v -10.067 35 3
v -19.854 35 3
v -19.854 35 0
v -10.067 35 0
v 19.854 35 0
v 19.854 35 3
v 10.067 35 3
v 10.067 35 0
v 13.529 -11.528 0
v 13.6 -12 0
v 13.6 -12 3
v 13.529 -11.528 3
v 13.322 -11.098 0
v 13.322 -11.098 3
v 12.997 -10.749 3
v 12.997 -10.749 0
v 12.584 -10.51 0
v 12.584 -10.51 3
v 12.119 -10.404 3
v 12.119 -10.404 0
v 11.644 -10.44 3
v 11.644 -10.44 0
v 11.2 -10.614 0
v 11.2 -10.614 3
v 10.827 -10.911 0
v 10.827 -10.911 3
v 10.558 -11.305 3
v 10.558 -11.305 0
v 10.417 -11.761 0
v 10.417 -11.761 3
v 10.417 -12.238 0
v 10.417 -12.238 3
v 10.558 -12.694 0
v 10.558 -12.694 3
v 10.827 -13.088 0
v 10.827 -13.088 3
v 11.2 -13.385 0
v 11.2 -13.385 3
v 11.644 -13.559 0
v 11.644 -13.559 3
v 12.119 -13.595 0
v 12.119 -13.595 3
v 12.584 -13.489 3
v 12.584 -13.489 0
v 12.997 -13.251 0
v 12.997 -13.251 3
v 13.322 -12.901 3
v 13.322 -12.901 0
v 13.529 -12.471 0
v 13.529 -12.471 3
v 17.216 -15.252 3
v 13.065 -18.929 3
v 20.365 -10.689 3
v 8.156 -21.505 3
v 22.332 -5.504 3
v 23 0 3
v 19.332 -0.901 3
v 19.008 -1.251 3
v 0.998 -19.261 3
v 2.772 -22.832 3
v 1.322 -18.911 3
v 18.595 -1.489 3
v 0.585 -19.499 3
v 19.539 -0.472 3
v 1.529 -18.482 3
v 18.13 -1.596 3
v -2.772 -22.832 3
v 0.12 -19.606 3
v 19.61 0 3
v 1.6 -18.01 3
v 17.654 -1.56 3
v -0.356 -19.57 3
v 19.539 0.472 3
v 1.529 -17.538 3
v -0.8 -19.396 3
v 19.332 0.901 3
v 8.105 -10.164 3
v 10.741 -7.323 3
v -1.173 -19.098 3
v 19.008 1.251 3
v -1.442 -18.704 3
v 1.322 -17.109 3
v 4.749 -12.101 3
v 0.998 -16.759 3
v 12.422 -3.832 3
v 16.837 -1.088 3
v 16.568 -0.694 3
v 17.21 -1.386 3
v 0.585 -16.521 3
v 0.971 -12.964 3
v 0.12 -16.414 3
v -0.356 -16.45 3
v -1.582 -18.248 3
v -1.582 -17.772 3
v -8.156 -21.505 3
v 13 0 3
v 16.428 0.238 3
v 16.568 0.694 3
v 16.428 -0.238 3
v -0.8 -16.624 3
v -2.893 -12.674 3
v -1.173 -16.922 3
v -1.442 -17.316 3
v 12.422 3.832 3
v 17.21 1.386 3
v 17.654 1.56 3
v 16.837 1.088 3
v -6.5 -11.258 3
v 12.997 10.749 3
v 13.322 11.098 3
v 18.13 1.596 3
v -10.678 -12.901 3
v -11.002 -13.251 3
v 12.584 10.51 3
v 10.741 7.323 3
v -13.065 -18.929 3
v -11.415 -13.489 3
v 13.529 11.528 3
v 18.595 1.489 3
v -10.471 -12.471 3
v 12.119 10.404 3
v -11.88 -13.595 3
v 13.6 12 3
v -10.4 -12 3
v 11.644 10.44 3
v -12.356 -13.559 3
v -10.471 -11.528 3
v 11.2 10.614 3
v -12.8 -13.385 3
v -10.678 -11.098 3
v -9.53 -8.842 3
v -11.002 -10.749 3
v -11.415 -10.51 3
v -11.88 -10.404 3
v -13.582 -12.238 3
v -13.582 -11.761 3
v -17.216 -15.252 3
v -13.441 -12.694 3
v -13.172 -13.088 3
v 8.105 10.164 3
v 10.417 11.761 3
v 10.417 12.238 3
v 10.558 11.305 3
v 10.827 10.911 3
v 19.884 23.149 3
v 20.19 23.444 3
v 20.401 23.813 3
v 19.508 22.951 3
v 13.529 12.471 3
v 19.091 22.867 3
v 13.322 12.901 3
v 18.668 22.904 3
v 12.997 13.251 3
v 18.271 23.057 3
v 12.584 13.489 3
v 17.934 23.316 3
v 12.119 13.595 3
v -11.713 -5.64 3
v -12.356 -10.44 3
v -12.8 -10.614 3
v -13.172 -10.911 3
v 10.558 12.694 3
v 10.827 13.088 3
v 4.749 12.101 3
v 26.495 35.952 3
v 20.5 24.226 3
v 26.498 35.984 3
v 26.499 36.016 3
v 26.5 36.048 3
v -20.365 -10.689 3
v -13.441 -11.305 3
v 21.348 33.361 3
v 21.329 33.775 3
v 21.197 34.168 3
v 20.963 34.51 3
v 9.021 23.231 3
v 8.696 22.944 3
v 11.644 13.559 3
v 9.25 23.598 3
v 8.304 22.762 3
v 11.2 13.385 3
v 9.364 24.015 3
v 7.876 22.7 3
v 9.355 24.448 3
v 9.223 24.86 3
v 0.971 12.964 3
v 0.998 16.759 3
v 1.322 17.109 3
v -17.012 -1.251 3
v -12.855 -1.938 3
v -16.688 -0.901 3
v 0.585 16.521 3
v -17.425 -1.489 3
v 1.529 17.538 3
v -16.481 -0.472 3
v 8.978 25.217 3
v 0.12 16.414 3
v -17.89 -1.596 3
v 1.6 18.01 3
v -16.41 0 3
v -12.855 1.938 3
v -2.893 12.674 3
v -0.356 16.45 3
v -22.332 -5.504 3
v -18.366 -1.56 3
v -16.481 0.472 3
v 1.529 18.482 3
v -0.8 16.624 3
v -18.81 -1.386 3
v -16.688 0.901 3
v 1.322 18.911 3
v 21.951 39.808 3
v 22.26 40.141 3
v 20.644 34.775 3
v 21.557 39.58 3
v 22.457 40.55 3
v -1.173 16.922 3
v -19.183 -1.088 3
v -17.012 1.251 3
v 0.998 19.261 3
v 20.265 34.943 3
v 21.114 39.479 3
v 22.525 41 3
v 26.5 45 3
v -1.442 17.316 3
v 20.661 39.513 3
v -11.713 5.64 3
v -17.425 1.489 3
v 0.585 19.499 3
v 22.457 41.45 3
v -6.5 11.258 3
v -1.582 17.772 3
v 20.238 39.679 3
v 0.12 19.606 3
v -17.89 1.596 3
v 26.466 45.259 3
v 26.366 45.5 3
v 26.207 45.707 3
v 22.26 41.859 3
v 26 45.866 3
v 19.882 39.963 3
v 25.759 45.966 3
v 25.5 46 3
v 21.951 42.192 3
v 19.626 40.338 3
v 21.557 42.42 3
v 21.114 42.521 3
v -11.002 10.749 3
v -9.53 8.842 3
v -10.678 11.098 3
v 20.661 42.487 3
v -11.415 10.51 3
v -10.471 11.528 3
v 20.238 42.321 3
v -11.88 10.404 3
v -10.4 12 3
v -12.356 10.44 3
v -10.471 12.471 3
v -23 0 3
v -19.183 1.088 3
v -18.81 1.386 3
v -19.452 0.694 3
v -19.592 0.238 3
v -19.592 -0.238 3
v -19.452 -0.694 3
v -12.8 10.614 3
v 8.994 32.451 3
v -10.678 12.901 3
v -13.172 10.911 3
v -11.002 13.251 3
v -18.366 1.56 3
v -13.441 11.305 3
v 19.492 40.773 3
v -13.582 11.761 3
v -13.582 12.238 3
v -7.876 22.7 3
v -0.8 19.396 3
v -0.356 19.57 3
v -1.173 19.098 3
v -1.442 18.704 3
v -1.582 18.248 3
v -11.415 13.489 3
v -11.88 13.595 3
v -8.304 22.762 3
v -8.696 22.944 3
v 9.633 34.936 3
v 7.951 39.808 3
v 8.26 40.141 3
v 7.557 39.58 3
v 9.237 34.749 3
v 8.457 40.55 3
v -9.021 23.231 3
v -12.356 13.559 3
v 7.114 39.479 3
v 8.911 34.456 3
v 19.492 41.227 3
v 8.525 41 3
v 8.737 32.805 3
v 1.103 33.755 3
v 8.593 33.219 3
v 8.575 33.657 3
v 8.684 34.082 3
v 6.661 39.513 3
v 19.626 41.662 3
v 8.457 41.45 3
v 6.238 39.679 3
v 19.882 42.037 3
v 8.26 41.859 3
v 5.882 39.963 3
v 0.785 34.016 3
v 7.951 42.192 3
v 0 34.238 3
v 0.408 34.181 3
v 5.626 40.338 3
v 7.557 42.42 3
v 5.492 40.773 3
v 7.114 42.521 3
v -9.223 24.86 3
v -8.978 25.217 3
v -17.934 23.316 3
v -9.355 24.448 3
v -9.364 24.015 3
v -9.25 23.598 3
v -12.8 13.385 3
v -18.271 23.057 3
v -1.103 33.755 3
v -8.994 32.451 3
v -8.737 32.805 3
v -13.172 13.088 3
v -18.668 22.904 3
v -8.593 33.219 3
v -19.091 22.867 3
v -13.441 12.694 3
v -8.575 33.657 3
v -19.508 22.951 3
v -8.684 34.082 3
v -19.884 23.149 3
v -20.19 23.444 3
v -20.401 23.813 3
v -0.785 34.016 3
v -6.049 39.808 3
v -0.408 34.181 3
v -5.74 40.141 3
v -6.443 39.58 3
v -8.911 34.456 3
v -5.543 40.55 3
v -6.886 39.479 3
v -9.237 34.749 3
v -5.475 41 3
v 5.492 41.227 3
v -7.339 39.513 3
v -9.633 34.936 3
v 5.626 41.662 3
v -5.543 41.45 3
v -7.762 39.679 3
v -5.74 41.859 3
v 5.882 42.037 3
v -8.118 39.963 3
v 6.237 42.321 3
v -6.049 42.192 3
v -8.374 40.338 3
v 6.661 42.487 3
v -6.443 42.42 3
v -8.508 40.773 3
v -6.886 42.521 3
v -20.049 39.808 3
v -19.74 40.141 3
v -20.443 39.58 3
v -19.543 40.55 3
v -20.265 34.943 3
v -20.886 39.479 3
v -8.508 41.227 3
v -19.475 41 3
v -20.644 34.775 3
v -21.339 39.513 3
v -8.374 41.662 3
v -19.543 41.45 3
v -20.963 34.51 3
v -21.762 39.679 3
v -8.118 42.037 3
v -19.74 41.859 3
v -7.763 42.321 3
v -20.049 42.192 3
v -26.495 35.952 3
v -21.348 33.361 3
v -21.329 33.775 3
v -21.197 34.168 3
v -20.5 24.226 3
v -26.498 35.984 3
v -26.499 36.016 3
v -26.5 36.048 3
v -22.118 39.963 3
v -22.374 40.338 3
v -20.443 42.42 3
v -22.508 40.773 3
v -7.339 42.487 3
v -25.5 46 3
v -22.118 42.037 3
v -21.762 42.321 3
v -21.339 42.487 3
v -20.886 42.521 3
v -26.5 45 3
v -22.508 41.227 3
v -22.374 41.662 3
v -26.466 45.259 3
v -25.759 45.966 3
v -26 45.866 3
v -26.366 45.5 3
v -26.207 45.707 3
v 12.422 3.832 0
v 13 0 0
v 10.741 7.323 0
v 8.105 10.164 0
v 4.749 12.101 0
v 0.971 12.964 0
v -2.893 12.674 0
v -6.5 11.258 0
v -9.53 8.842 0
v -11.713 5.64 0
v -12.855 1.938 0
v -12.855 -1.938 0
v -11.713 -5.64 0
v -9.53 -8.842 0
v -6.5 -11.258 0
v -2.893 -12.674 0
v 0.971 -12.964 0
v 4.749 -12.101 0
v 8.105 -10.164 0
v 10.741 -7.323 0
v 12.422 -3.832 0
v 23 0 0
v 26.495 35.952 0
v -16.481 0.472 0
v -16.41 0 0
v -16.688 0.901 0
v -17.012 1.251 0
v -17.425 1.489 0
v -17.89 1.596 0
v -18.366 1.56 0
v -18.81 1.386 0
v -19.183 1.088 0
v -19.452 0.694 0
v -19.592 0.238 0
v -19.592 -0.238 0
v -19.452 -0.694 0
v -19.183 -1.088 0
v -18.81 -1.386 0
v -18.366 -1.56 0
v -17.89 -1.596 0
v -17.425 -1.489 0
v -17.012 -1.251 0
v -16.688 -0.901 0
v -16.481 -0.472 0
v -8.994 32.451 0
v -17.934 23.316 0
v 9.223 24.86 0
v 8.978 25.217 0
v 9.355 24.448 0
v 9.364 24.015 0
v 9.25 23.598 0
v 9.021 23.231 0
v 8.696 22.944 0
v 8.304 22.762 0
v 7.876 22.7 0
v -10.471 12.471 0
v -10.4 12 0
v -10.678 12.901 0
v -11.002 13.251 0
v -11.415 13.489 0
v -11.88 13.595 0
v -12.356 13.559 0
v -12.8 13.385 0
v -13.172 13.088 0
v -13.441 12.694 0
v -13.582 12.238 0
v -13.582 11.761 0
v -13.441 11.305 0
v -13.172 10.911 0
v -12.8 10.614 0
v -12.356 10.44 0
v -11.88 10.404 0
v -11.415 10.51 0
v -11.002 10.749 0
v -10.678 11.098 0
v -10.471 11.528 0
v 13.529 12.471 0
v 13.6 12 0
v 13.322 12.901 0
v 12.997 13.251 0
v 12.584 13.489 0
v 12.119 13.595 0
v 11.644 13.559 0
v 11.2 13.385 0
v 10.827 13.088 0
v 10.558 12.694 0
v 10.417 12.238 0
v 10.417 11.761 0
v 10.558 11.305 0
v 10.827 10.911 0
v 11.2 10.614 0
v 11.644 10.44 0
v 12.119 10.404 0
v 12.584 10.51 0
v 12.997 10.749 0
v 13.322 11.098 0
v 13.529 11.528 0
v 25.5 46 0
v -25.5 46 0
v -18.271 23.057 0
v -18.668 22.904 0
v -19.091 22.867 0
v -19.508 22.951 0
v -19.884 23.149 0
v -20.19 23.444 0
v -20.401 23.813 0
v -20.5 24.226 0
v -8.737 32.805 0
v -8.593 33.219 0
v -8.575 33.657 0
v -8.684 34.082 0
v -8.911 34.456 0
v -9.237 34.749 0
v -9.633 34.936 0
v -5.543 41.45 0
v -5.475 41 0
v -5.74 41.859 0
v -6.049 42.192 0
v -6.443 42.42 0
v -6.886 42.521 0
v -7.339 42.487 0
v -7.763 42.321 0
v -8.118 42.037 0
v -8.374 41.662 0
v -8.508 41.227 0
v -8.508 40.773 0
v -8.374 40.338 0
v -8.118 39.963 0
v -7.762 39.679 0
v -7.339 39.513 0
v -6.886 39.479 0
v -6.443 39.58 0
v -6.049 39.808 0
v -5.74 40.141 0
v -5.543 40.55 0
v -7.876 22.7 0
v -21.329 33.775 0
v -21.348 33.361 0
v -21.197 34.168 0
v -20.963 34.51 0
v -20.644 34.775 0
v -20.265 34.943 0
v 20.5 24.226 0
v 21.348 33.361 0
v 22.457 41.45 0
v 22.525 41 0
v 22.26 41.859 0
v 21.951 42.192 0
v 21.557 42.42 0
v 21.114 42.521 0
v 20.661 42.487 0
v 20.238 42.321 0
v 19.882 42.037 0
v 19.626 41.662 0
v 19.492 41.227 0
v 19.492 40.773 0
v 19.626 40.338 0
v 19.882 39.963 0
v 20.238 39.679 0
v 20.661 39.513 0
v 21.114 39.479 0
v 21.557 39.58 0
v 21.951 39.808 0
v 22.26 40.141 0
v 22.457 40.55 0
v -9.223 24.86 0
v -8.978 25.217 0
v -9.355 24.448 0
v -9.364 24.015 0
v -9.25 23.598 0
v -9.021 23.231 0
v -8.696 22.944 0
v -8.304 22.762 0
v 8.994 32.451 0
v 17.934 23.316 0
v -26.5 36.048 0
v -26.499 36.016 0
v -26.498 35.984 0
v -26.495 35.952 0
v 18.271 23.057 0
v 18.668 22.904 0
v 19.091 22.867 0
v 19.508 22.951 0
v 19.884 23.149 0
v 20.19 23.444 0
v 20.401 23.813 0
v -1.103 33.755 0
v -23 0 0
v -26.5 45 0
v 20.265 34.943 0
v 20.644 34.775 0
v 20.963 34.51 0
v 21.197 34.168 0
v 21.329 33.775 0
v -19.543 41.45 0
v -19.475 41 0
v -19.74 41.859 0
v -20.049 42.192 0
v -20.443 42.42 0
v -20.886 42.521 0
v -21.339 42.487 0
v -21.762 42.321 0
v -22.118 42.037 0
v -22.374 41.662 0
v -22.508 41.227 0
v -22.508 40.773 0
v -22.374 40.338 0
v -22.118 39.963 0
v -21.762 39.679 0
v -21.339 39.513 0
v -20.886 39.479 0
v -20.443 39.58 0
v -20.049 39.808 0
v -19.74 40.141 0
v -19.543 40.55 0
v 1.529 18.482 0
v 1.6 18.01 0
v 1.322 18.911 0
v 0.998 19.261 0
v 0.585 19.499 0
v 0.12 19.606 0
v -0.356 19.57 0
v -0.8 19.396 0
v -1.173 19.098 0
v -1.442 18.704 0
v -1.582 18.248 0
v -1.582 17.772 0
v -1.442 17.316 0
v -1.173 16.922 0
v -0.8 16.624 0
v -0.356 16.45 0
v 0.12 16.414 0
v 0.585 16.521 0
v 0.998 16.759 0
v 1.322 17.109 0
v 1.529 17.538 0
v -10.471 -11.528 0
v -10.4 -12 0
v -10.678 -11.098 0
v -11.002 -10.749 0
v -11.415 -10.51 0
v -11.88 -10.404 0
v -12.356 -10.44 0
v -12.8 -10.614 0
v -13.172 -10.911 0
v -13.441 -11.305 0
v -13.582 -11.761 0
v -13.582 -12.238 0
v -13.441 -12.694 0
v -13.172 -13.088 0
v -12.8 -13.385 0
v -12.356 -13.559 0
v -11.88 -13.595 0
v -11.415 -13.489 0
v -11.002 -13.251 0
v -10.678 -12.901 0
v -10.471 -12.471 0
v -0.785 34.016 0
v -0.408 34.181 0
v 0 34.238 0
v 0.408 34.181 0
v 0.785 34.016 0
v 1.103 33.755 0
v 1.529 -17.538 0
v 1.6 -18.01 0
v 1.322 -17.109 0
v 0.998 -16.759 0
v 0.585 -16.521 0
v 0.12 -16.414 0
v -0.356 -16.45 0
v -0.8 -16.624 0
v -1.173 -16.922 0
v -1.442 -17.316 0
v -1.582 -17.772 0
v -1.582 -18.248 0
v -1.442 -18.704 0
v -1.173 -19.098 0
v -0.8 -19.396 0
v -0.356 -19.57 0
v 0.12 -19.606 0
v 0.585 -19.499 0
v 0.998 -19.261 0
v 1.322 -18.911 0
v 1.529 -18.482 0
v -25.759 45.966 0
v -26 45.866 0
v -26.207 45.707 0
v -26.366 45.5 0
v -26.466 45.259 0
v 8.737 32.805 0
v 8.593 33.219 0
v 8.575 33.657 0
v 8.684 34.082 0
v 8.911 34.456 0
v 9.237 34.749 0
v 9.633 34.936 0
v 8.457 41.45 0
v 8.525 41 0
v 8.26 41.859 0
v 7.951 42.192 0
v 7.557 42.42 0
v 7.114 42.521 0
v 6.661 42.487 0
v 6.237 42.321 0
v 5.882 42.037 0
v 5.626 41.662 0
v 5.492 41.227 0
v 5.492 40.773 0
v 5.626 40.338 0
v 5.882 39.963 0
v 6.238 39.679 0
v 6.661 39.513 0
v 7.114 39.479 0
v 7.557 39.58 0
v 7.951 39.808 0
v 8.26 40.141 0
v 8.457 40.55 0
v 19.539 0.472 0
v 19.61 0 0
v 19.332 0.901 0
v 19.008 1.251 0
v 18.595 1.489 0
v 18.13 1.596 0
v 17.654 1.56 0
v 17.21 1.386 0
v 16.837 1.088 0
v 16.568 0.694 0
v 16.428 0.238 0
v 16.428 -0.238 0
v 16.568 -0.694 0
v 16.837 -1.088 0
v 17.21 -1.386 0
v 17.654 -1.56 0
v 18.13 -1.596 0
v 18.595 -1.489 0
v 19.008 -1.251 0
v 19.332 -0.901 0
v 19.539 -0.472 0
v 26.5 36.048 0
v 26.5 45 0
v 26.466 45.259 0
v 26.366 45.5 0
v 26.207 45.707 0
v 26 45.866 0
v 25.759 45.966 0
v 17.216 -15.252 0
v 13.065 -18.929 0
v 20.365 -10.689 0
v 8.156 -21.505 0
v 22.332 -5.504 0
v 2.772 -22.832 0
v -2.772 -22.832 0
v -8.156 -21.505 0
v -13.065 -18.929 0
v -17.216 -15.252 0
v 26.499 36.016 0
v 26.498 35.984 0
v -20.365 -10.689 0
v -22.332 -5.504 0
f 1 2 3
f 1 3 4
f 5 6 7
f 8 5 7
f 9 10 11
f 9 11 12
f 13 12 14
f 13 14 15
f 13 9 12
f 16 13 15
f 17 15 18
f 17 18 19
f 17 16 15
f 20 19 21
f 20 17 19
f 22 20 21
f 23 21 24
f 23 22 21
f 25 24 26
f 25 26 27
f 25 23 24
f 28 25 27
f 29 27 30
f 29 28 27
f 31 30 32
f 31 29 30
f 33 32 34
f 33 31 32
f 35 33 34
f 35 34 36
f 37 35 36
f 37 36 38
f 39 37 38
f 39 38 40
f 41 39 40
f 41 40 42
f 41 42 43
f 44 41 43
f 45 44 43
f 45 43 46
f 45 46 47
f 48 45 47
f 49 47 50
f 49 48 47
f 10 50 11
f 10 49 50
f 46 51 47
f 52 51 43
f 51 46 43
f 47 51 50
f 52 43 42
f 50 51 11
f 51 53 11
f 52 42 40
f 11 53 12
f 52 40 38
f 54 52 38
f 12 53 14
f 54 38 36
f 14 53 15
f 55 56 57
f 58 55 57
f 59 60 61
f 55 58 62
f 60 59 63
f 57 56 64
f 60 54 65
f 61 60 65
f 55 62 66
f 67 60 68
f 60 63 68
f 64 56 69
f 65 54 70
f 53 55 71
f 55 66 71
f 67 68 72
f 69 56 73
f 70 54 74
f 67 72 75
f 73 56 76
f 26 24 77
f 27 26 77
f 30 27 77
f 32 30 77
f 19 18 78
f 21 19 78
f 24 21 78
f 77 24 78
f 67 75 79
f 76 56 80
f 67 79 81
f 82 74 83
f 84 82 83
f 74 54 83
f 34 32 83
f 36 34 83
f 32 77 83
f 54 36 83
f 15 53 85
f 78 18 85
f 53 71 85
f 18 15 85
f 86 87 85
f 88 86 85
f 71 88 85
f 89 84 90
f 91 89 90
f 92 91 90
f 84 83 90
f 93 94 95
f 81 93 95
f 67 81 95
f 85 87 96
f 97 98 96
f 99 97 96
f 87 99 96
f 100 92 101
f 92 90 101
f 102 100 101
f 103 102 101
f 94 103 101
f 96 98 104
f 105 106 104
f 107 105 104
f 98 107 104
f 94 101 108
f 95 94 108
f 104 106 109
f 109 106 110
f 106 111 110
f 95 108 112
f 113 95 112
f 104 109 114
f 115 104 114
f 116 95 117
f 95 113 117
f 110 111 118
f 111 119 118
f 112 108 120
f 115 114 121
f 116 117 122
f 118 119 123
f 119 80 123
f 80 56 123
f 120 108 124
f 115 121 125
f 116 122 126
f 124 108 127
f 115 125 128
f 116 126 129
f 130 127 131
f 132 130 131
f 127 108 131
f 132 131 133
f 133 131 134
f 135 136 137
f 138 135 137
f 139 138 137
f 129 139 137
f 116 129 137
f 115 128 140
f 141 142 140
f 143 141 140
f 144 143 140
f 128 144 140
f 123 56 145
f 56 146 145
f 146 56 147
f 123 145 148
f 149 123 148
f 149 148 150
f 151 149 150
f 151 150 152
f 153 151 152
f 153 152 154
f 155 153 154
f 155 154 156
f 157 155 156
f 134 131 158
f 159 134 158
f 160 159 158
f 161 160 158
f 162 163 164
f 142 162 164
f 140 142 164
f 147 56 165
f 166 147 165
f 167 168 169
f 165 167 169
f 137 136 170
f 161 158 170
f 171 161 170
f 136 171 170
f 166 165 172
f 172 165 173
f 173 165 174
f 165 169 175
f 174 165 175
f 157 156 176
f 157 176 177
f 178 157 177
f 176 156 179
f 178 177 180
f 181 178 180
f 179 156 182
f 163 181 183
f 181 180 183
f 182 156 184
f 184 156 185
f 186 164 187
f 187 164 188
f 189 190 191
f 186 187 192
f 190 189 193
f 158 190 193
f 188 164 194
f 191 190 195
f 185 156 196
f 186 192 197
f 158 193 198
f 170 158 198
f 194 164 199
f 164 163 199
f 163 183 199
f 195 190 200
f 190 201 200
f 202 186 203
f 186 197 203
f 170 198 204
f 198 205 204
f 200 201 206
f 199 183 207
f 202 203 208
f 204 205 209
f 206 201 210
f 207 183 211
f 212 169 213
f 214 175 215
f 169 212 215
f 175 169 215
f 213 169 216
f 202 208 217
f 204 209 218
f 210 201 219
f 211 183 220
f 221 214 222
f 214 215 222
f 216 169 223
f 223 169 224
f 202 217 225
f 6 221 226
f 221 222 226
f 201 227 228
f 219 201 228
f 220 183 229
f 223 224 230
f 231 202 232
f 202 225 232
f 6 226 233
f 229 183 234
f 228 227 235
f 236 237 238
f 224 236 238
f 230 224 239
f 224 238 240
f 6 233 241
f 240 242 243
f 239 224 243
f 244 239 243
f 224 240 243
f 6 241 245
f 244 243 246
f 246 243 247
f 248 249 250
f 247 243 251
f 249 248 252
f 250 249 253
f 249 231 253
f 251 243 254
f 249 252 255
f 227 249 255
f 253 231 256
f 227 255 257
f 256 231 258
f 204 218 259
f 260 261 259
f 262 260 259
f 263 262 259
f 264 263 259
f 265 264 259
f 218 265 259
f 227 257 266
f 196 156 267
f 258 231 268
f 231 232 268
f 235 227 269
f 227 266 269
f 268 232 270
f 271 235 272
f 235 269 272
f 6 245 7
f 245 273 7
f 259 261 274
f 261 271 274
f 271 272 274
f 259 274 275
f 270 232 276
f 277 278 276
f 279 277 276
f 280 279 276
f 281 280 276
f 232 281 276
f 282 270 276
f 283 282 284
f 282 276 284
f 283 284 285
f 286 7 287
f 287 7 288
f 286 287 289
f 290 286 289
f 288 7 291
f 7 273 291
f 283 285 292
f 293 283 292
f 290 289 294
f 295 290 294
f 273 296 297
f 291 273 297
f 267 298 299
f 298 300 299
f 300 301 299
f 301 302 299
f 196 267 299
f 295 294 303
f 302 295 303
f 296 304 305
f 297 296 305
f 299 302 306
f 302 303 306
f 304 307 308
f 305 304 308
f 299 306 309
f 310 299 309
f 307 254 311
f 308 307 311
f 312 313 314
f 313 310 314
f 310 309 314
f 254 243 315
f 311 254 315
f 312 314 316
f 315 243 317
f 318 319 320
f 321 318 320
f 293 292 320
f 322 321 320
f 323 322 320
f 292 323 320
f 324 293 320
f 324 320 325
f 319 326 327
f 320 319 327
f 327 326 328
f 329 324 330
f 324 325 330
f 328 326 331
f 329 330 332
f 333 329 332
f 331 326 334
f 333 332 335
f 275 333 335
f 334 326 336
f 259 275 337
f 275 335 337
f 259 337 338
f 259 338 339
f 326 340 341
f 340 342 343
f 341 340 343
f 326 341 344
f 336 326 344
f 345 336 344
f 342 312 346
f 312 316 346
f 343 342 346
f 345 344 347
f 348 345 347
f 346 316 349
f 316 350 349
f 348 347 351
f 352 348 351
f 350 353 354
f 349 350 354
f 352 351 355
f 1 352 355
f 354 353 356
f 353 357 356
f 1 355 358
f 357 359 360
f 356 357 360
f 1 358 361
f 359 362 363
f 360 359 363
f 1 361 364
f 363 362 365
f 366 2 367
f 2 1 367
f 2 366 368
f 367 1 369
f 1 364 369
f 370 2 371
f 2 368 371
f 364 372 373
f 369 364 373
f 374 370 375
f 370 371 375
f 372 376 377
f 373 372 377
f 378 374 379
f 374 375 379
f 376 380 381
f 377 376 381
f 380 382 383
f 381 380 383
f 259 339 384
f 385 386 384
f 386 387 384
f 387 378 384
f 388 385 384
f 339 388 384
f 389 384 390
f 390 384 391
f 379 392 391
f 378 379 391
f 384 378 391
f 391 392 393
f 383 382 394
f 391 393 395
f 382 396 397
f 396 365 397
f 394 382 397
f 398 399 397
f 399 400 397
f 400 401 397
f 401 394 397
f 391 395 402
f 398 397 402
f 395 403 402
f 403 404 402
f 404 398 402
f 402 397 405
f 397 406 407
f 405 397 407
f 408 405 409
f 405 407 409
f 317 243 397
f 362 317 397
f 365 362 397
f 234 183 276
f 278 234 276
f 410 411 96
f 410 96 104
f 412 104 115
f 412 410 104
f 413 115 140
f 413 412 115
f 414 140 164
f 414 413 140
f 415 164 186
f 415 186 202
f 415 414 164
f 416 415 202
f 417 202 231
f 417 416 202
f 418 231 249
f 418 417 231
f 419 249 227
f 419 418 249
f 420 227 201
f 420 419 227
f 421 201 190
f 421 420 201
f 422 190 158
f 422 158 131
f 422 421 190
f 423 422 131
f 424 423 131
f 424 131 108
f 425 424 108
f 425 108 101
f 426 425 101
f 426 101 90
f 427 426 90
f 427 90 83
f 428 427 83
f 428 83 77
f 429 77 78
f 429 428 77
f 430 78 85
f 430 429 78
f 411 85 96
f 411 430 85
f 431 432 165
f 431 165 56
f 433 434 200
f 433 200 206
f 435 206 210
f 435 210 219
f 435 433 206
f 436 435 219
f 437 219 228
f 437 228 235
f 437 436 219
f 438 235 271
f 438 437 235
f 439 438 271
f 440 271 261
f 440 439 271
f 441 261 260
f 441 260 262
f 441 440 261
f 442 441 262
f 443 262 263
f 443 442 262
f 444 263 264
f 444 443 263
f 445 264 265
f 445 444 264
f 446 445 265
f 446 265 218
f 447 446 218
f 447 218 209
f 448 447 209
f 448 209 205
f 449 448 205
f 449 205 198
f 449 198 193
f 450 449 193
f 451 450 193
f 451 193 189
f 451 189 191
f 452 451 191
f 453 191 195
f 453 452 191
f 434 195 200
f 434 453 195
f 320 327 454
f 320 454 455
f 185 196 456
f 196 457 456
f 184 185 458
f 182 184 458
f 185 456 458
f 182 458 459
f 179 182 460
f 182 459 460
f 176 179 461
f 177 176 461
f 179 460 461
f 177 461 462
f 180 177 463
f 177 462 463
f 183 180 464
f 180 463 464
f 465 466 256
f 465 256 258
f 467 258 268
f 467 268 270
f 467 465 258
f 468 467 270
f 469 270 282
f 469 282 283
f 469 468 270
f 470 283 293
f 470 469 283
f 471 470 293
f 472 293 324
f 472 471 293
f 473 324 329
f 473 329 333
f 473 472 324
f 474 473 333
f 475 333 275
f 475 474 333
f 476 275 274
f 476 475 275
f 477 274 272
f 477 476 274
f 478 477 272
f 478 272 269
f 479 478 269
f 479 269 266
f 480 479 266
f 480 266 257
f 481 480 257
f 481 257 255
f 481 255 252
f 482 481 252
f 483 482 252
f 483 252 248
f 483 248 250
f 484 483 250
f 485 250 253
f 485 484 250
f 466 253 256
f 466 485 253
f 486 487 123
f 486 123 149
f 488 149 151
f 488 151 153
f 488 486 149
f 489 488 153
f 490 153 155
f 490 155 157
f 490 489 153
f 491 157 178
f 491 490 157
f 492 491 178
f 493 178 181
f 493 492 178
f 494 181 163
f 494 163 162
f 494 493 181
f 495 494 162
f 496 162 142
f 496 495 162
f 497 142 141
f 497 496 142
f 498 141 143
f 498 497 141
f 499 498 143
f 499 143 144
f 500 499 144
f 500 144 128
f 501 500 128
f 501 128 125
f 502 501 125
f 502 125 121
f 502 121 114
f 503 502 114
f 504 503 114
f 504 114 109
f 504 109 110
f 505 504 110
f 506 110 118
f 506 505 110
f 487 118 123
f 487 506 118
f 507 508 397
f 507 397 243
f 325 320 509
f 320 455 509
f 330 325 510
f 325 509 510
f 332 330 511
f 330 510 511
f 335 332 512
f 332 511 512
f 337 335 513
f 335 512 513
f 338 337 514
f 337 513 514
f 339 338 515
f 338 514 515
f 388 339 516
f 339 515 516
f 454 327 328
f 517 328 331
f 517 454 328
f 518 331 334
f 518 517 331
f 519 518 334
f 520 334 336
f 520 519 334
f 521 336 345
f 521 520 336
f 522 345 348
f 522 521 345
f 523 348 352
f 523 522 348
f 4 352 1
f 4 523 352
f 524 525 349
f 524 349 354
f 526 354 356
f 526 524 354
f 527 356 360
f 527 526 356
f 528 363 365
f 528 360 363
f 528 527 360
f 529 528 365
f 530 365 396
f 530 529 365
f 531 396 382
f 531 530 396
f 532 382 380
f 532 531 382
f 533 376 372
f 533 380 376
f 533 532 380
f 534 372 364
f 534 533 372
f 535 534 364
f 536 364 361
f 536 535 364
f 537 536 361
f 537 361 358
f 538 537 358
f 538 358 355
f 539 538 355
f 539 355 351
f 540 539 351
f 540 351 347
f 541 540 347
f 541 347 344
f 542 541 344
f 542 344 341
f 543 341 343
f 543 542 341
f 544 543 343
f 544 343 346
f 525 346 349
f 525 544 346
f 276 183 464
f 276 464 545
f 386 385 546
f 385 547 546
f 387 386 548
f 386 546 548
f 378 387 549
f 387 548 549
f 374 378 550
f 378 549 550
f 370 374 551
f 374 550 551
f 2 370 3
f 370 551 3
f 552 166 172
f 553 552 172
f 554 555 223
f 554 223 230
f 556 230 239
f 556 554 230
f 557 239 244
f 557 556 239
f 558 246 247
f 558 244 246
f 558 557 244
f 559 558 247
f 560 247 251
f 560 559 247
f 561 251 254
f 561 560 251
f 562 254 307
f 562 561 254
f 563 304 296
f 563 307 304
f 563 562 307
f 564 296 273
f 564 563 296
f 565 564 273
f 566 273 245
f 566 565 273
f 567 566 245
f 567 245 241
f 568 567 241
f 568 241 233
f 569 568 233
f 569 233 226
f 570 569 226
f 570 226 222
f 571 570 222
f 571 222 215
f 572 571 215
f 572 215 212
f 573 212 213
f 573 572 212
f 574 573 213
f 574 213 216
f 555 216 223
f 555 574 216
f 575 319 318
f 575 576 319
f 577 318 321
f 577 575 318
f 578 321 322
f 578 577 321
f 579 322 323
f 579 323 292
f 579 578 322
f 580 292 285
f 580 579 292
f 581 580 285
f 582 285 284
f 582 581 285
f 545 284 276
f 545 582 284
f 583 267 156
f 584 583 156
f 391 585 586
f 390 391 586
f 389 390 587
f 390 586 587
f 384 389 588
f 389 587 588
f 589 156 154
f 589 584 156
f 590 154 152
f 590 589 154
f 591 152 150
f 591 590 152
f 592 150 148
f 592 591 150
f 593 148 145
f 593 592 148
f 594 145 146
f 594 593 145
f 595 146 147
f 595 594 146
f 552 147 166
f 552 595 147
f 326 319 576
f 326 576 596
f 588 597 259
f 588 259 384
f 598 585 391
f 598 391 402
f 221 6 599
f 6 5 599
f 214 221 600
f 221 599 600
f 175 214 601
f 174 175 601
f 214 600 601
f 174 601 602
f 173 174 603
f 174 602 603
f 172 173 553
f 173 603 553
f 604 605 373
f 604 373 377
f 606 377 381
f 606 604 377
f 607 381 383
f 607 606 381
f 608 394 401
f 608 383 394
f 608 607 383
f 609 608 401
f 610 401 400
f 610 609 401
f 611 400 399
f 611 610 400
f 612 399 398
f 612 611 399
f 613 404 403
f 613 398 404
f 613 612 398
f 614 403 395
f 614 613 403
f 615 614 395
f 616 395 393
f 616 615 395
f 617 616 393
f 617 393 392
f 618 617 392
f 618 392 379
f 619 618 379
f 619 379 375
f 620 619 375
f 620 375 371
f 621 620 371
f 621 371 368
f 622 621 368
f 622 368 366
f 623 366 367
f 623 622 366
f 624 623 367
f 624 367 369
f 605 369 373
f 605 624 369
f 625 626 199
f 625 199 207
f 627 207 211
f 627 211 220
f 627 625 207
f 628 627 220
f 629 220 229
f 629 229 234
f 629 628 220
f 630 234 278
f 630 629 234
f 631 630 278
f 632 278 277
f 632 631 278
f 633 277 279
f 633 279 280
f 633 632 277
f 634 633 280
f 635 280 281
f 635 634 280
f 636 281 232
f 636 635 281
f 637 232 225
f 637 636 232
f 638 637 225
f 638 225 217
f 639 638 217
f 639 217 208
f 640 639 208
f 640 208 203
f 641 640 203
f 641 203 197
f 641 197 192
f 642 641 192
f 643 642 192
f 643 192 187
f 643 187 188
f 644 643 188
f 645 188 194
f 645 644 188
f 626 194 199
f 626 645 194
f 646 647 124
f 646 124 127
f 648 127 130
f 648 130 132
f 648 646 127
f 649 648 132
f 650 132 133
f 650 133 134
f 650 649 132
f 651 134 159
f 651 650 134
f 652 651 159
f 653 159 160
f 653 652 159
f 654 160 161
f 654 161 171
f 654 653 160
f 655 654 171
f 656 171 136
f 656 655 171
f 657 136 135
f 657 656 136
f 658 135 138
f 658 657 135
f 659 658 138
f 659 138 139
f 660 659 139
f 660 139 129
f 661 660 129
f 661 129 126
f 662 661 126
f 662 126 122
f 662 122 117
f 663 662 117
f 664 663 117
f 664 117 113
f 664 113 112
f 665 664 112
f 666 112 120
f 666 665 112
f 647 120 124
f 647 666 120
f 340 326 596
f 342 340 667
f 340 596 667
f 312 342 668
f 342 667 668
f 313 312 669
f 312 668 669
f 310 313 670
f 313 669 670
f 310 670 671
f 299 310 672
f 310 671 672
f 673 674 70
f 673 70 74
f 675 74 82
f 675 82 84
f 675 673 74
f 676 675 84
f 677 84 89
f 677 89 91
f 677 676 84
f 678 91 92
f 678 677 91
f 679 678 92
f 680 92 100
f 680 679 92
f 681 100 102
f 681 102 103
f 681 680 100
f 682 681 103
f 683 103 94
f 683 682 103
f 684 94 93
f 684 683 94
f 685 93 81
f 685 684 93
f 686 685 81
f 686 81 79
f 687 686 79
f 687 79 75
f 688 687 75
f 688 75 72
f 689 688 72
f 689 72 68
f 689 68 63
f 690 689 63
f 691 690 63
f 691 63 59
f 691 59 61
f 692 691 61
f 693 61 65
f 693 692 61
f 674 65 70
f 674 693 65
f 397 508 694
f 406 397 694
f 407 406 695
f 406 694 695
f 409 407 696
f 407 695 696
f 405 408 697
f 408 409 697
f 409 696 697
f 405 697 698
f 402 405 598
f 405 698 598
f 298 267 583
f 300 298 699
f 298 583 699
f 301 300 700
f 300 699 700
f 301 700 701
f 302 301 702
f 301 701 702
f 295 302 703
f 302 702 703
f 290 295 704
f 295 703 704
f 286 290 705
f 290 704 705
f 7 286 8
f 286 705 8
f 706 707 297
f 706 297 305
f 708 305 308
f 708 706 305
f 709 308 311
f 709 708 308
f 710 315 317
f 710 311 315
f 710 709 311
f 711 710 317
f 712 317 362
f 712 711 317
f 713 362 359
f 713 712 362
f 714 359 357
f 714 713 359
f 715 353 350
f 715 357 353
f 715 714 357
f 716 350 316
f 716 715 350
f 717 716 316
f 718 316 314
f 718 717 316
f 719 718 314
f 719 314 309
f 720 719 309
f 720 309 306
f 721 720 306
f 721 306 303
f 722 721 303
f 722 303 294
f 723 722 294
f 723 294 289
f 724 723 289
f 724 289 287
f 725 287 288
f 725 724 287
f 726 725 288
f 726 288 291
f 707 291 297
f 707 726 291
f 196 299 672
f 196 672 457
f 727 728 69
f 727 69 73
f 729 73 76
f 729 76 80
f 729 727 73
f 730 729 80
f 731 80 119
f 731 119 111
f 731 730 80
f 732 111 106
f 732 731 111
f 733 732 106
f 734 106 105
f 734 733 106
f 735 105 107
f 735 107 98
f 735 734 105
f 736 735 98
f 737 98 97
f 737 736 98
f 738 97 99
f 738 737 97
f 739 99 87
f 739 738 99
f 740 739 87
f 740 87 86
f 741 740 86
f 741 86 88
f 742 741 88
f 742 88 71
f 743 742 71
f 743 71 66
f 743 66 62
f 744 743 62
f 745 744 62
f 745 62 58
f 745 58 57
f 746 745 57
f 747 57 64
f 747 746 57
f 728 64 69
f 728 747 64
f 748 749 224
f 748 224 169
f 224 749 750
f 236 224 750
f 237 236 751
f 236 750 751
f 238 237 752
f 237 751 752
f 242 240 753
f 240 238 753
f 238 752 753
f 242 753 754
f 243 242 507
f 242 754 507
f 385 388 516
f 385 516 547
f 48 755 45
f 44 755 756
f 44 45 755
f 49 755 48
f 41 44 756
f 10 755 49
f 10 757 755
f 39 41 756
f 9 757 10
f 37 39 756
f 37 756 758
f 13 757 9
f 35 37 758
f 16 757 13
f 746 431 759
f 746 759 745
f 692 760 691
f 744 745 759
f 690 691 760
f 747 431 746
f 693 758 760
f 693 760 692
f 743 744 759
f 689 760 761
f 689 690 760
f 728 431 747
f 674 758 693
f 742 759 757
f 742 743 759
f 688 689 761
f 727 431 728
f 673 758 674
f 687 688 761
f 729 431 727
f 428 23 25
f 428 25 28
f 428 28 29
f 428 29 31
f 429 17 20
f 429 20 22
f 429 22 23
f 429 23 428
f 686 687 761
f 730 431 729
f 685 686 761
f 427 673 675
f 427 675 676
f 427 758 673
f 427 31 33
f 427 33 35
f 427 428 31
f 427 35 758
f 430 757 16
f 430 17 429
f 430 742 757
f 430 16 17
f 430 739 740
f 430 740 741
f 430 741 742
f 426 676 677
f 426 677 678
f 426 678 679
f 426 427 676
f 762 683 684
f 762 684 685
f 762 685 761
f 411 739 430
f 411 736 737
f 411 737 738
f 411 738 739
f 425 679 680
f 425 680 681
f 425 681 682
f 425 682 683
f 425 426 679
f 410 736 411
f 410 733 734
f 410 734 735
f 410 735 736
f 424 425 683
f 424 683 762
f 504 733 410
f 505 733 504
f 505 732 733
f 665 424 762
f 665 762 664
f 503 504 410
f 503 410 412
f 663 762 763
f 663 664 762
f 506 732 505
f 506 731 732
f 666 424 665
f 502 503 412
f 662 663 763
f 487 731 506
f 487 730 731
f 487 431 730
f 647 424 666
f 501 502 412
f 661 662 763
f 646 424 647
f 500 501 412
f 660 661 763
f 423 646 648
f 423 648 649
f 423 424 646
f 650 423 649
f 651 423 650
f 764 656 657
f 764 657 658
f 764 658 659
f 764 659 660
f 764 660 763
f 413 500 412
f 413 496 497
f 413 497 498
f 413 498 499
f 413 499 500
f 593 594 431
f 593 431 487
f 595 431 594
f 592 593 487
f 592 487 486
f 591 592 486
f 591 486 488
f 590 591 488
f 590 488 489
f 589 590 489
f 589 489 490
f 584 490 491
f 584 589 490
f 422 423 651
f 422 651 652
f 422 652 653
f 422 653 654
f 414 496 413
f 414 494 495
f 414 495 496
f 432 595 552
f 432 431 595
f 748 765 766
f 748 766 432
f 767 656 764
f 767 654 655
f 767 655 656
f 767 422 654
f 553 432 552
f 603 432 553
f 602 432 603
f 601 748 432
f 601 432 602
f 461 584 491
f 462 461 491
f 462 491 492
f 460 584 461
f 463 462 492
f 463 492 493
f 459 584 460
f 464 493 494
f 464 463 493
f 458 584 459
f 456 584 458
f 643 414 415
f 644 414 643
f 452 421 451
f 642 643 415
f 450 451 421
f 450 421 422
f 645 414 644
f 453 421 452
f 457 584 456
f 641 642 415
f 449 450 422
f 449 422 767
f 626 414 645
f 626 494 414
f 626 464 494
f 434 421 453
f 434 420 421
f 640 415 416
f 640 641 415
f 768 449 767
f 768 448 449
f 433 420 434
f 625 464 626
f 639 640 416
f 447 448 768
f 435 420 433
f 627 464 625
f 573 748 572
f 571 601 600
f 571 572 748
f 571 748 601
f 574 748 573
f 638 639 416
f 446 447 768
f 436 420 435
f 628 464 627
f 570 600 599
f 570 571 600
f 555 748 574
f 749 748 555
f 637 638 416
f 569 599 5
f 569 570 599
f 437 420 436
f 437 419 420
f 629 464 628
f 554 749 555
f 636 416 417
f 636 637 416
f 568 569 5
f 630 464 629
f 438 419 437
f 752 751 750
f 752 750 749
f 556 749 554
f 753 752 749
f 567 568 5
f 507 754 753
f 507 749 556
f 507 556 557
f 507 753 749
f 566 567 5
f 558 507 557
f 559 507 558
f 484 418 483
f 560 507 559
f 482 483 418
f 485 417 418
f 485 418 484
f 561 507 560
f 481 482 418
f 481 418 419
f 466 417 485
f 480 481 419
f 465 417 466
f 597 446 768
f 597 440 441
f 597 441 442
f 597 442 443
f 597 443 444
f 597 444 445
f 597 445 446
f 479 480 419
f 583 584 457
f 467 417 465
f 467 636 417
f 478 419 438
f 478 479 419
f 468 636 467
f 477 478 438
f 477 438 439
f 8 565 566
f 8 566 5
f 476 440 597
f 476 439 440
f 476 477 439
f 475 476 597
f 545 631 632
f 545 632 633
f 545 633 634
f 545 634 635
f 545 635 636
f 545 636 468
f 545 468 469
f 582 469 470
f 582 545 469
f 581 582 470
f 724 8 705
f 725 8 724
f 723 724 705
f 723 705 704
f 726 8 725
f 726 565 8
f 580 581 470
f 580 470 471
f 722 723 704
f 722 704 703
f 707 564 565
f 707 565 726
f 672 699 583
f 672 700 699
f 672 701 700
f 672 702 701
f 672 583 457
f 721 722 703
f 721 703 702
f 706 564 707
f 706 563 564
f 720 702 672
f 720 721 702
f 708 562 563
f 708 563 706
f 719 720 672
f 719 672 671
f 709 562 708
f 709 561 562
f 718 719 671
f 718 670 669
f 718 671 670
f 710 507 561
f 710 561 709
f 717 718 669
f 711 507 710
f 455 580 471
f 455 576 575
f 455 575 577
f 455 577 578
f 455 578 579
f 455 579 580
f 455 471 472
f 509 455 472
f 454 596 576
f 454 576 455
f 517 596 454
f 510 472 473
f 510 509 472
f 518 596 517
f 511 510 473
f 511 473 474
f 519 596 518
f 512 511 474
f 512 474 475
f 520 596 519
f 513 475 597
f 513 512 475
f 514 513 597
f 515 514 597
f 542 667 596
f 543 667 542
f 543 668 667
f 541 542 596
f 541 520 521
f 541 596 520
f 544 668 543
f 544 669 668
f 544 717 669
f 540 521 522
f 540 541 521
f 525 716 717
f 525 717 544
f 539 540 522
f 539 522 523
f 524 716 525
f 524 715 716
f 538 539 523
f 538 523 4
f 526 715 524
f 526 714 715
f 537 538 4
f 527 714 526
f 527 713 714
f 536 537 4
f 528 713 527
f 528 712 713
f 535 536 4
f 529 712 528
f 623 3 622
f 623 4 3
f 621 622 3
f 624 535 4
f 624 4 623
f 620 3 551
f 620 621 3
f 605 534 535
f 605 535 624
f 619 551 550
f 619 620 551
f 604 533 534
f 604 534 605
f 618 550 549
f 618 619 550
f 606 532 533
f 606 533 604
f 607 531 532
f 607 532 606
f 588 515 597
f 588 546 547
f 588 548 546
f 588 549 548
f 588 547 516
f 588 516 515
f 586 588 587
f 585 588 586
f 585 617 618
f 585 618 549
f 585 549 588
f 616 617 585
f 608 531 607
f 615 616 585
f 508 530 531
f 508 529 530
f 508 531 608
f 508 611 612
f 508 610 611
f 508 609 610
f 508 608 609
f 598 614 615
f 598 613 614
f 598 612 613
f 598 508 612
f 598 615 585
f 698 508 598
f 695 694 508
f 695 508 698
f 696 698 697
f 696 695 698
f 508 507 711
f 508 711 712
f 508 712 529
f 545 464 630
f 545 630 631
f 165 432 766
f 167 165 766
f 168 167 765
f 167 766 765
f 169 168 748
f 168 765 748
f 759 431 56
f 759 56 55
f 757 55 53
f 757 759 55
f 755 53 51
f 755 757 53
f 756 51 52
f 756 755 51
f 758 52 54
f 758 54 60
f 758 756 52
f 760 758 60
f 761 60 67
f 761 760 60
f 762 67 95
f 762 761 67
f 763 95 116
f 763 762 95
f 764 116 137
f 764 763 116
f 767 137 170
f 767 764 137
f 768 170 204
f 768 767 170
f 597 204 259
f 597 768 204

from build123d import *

# Parameters (mm, degrees)
EXTRUDE_2_DEPTH          = 3
FILLET_3_R               = 1
SKETCH_3_R               = 13
SKETCH_3_R_2             = 1.6
CUT_EXTRUDE_5_DEPTH      = 3
CUT_EXTRUDE_6_DEPTH      = 54.17189107
CUT_EXTRUDE_6_DEPTH_BACK = 54.17189107
SKETCH_4_R               = 1.525
CUT_EXTRUDE_7_DEPTH      = 10
FILLET_4_R               = 1.5


with BuildPart() as part:
    # 草圖2 → 填料-伸長2 (new body)
    with BuildSketch(Plane.XY):
        with BuildLine():
            Line((-26.5, 46), (26.5, 46))
            Line((26.5, 46), (26.5, 36))
            Line((26.5, 36), (23, 0))
            ThreePointArc((23, 0), (0, -23), (-23, 0))
            Line((-23, 0), (-26.5, 36))
            Line((-26.5, 36), (-26.5, 46))
        make_face()
    extrude(amount=EXTRUDE_2_DEPTH)

    # 圓角3
    # the kernel refuses this fillet: 1 mm, written as the material it takes off along each edge
    with BuildSketch(Plane(origin=(-26.5, 46, -2.5), x_dir=(0, -1, 0), z_dir=(0, 0, 1)), Plane(origin=(26.5, 46, -2.5), x_dir=(-1, 0, 0), z_dir=(0, 0, 1))) as fillet_3_piece_1:
        with BuildLine():
            CenterArc((FILLET_3_R, FILLET_3_R), FILLET_3_R, 180, 90)
            Line((0, FILLET_3_R), (0, 0))
            Line((0, 0), (FILLET_3_R, 0))
        make_face()
    extrude(amount=8, mode=Mode.SUBTRACT)
    with BuildSketch(Plane(origin=(26.5, 36, -0.121241952), x_dir=(0, 1, 0), z_dir=(0, 0, 1)), Plane(origin=(-26.5, 36, -0.121241952), x_dir=(0.0967659740606196, -0.9953071617667079, 0), z_dir=(0, 0, 1))) as fillet_3_piece_2:
        with BuildLine():
            CenterArc((FILLET_3_R * 0.0484967808039, FILLET_3_R), FILLET_3_R, 264.447028967, 5.552971033)
            Line((-FILLET_3_R * 0.0482691932568, FILLET_3_R * 0.0046928382333), (0, 0))
            Line((0, 0), (FILLET_3_R * 0.0484967808039, 0))
        make_face()
    extrude(amount=3.242483904, mode=Mode.SUBTRACT)

    # 草圖3 → 除料-伸長5 (cut)
    with BuildSketch(Plane.XY):
        Circle(SKETCH_3_R)
        with Locations((18.009998301, 0)):
            Circle(SKETCH_3_R_2)
        with Locations((0, -18.009998301)):
            Circle(SKETCH_3_R_2)
        with Locations((-18.009998301, 0)):
            Circle(SKETCH_3_R_2)
        with Locations((0, 18.009998301)):
            Circle(SKETCH_3_R_2)
        with Locations((11.999602077, 11.999602077)):
            Circle(SKETCH_3_R_2)
        with Locations((11.999602077, -11.999602077)):
            Circle(SKETCH_3_R_2)
        with Locations((-11.999602077, -11.999602077)):
            Circle(SKETCH_3_R_2)
        with Locations((-11.999602077, 11.999602077)):
            Circle(SKETCH_3_R_2)
    extrude(amount=CUT_EXTRUDE_5_DEPTH, mode=Mode.SUBTRACT)

    # 草圖4 → 除料-伸長6 (cut, two sides: drawn at the far end of the back side and taken through both)
    with BuildSketch(Plane.XY.offset(-CUT_EXTRUDE_6_DEPTH_BACK)):
        with Locations((21, 41)):
            Circle(SKETCH_4_R)
        with Locations((7, 41)):
            Circle(SKETCH_4_R)
        with Locations((-7, 41)):
            Circle(SKETCH_4_R)
        with Locations((-21, 41)):
            Circle(SKETCH_4_R)
    extrude(amount=CUT_EXTRUDE_6_DEPTH + CUT_EXTRUDE_6_DEPTH_BACK, mode=Mode.SUBTRACT)

    # 草圖5 → 除料-伸長7 (cut)
    with BuildSketch(Plane.XY.offset(3)):
        Polygon((-21.5, 35), (-6.5, 35), (-20.2, 21), align=None)
        Polygon((11.3, 22.7), (-11.3, 22.7), (0, 34.95), align=None)
        Polygon((6.5, 35), (20.2, 21), (21.5, 35), align=None)
    extrude(amount=-CUT_EXTRUDE_7_DEPTH, mode=Mode.SUBTRACT)

    # 圓角4
    fillet_4_edges = [part.edges().sort_by_distance(p)[0] for p in [
        (6.5, 35, 1.5),
        (21.5, 35, 1.5),
        (20.2, 21, 1.5),
        (-11.3, 22.7, 1.5),
        (0, 34.95, 1.5),
        (11.3, 22.7, 1.5),
        (-20.2, 21, 1.5),
        (-21.5, 35, 1.5),
        (-6.5, 35, 1.5),
    ]]
    fillet(fillet_4_edges, radius=FILLET_4_R)


solid = part.part
